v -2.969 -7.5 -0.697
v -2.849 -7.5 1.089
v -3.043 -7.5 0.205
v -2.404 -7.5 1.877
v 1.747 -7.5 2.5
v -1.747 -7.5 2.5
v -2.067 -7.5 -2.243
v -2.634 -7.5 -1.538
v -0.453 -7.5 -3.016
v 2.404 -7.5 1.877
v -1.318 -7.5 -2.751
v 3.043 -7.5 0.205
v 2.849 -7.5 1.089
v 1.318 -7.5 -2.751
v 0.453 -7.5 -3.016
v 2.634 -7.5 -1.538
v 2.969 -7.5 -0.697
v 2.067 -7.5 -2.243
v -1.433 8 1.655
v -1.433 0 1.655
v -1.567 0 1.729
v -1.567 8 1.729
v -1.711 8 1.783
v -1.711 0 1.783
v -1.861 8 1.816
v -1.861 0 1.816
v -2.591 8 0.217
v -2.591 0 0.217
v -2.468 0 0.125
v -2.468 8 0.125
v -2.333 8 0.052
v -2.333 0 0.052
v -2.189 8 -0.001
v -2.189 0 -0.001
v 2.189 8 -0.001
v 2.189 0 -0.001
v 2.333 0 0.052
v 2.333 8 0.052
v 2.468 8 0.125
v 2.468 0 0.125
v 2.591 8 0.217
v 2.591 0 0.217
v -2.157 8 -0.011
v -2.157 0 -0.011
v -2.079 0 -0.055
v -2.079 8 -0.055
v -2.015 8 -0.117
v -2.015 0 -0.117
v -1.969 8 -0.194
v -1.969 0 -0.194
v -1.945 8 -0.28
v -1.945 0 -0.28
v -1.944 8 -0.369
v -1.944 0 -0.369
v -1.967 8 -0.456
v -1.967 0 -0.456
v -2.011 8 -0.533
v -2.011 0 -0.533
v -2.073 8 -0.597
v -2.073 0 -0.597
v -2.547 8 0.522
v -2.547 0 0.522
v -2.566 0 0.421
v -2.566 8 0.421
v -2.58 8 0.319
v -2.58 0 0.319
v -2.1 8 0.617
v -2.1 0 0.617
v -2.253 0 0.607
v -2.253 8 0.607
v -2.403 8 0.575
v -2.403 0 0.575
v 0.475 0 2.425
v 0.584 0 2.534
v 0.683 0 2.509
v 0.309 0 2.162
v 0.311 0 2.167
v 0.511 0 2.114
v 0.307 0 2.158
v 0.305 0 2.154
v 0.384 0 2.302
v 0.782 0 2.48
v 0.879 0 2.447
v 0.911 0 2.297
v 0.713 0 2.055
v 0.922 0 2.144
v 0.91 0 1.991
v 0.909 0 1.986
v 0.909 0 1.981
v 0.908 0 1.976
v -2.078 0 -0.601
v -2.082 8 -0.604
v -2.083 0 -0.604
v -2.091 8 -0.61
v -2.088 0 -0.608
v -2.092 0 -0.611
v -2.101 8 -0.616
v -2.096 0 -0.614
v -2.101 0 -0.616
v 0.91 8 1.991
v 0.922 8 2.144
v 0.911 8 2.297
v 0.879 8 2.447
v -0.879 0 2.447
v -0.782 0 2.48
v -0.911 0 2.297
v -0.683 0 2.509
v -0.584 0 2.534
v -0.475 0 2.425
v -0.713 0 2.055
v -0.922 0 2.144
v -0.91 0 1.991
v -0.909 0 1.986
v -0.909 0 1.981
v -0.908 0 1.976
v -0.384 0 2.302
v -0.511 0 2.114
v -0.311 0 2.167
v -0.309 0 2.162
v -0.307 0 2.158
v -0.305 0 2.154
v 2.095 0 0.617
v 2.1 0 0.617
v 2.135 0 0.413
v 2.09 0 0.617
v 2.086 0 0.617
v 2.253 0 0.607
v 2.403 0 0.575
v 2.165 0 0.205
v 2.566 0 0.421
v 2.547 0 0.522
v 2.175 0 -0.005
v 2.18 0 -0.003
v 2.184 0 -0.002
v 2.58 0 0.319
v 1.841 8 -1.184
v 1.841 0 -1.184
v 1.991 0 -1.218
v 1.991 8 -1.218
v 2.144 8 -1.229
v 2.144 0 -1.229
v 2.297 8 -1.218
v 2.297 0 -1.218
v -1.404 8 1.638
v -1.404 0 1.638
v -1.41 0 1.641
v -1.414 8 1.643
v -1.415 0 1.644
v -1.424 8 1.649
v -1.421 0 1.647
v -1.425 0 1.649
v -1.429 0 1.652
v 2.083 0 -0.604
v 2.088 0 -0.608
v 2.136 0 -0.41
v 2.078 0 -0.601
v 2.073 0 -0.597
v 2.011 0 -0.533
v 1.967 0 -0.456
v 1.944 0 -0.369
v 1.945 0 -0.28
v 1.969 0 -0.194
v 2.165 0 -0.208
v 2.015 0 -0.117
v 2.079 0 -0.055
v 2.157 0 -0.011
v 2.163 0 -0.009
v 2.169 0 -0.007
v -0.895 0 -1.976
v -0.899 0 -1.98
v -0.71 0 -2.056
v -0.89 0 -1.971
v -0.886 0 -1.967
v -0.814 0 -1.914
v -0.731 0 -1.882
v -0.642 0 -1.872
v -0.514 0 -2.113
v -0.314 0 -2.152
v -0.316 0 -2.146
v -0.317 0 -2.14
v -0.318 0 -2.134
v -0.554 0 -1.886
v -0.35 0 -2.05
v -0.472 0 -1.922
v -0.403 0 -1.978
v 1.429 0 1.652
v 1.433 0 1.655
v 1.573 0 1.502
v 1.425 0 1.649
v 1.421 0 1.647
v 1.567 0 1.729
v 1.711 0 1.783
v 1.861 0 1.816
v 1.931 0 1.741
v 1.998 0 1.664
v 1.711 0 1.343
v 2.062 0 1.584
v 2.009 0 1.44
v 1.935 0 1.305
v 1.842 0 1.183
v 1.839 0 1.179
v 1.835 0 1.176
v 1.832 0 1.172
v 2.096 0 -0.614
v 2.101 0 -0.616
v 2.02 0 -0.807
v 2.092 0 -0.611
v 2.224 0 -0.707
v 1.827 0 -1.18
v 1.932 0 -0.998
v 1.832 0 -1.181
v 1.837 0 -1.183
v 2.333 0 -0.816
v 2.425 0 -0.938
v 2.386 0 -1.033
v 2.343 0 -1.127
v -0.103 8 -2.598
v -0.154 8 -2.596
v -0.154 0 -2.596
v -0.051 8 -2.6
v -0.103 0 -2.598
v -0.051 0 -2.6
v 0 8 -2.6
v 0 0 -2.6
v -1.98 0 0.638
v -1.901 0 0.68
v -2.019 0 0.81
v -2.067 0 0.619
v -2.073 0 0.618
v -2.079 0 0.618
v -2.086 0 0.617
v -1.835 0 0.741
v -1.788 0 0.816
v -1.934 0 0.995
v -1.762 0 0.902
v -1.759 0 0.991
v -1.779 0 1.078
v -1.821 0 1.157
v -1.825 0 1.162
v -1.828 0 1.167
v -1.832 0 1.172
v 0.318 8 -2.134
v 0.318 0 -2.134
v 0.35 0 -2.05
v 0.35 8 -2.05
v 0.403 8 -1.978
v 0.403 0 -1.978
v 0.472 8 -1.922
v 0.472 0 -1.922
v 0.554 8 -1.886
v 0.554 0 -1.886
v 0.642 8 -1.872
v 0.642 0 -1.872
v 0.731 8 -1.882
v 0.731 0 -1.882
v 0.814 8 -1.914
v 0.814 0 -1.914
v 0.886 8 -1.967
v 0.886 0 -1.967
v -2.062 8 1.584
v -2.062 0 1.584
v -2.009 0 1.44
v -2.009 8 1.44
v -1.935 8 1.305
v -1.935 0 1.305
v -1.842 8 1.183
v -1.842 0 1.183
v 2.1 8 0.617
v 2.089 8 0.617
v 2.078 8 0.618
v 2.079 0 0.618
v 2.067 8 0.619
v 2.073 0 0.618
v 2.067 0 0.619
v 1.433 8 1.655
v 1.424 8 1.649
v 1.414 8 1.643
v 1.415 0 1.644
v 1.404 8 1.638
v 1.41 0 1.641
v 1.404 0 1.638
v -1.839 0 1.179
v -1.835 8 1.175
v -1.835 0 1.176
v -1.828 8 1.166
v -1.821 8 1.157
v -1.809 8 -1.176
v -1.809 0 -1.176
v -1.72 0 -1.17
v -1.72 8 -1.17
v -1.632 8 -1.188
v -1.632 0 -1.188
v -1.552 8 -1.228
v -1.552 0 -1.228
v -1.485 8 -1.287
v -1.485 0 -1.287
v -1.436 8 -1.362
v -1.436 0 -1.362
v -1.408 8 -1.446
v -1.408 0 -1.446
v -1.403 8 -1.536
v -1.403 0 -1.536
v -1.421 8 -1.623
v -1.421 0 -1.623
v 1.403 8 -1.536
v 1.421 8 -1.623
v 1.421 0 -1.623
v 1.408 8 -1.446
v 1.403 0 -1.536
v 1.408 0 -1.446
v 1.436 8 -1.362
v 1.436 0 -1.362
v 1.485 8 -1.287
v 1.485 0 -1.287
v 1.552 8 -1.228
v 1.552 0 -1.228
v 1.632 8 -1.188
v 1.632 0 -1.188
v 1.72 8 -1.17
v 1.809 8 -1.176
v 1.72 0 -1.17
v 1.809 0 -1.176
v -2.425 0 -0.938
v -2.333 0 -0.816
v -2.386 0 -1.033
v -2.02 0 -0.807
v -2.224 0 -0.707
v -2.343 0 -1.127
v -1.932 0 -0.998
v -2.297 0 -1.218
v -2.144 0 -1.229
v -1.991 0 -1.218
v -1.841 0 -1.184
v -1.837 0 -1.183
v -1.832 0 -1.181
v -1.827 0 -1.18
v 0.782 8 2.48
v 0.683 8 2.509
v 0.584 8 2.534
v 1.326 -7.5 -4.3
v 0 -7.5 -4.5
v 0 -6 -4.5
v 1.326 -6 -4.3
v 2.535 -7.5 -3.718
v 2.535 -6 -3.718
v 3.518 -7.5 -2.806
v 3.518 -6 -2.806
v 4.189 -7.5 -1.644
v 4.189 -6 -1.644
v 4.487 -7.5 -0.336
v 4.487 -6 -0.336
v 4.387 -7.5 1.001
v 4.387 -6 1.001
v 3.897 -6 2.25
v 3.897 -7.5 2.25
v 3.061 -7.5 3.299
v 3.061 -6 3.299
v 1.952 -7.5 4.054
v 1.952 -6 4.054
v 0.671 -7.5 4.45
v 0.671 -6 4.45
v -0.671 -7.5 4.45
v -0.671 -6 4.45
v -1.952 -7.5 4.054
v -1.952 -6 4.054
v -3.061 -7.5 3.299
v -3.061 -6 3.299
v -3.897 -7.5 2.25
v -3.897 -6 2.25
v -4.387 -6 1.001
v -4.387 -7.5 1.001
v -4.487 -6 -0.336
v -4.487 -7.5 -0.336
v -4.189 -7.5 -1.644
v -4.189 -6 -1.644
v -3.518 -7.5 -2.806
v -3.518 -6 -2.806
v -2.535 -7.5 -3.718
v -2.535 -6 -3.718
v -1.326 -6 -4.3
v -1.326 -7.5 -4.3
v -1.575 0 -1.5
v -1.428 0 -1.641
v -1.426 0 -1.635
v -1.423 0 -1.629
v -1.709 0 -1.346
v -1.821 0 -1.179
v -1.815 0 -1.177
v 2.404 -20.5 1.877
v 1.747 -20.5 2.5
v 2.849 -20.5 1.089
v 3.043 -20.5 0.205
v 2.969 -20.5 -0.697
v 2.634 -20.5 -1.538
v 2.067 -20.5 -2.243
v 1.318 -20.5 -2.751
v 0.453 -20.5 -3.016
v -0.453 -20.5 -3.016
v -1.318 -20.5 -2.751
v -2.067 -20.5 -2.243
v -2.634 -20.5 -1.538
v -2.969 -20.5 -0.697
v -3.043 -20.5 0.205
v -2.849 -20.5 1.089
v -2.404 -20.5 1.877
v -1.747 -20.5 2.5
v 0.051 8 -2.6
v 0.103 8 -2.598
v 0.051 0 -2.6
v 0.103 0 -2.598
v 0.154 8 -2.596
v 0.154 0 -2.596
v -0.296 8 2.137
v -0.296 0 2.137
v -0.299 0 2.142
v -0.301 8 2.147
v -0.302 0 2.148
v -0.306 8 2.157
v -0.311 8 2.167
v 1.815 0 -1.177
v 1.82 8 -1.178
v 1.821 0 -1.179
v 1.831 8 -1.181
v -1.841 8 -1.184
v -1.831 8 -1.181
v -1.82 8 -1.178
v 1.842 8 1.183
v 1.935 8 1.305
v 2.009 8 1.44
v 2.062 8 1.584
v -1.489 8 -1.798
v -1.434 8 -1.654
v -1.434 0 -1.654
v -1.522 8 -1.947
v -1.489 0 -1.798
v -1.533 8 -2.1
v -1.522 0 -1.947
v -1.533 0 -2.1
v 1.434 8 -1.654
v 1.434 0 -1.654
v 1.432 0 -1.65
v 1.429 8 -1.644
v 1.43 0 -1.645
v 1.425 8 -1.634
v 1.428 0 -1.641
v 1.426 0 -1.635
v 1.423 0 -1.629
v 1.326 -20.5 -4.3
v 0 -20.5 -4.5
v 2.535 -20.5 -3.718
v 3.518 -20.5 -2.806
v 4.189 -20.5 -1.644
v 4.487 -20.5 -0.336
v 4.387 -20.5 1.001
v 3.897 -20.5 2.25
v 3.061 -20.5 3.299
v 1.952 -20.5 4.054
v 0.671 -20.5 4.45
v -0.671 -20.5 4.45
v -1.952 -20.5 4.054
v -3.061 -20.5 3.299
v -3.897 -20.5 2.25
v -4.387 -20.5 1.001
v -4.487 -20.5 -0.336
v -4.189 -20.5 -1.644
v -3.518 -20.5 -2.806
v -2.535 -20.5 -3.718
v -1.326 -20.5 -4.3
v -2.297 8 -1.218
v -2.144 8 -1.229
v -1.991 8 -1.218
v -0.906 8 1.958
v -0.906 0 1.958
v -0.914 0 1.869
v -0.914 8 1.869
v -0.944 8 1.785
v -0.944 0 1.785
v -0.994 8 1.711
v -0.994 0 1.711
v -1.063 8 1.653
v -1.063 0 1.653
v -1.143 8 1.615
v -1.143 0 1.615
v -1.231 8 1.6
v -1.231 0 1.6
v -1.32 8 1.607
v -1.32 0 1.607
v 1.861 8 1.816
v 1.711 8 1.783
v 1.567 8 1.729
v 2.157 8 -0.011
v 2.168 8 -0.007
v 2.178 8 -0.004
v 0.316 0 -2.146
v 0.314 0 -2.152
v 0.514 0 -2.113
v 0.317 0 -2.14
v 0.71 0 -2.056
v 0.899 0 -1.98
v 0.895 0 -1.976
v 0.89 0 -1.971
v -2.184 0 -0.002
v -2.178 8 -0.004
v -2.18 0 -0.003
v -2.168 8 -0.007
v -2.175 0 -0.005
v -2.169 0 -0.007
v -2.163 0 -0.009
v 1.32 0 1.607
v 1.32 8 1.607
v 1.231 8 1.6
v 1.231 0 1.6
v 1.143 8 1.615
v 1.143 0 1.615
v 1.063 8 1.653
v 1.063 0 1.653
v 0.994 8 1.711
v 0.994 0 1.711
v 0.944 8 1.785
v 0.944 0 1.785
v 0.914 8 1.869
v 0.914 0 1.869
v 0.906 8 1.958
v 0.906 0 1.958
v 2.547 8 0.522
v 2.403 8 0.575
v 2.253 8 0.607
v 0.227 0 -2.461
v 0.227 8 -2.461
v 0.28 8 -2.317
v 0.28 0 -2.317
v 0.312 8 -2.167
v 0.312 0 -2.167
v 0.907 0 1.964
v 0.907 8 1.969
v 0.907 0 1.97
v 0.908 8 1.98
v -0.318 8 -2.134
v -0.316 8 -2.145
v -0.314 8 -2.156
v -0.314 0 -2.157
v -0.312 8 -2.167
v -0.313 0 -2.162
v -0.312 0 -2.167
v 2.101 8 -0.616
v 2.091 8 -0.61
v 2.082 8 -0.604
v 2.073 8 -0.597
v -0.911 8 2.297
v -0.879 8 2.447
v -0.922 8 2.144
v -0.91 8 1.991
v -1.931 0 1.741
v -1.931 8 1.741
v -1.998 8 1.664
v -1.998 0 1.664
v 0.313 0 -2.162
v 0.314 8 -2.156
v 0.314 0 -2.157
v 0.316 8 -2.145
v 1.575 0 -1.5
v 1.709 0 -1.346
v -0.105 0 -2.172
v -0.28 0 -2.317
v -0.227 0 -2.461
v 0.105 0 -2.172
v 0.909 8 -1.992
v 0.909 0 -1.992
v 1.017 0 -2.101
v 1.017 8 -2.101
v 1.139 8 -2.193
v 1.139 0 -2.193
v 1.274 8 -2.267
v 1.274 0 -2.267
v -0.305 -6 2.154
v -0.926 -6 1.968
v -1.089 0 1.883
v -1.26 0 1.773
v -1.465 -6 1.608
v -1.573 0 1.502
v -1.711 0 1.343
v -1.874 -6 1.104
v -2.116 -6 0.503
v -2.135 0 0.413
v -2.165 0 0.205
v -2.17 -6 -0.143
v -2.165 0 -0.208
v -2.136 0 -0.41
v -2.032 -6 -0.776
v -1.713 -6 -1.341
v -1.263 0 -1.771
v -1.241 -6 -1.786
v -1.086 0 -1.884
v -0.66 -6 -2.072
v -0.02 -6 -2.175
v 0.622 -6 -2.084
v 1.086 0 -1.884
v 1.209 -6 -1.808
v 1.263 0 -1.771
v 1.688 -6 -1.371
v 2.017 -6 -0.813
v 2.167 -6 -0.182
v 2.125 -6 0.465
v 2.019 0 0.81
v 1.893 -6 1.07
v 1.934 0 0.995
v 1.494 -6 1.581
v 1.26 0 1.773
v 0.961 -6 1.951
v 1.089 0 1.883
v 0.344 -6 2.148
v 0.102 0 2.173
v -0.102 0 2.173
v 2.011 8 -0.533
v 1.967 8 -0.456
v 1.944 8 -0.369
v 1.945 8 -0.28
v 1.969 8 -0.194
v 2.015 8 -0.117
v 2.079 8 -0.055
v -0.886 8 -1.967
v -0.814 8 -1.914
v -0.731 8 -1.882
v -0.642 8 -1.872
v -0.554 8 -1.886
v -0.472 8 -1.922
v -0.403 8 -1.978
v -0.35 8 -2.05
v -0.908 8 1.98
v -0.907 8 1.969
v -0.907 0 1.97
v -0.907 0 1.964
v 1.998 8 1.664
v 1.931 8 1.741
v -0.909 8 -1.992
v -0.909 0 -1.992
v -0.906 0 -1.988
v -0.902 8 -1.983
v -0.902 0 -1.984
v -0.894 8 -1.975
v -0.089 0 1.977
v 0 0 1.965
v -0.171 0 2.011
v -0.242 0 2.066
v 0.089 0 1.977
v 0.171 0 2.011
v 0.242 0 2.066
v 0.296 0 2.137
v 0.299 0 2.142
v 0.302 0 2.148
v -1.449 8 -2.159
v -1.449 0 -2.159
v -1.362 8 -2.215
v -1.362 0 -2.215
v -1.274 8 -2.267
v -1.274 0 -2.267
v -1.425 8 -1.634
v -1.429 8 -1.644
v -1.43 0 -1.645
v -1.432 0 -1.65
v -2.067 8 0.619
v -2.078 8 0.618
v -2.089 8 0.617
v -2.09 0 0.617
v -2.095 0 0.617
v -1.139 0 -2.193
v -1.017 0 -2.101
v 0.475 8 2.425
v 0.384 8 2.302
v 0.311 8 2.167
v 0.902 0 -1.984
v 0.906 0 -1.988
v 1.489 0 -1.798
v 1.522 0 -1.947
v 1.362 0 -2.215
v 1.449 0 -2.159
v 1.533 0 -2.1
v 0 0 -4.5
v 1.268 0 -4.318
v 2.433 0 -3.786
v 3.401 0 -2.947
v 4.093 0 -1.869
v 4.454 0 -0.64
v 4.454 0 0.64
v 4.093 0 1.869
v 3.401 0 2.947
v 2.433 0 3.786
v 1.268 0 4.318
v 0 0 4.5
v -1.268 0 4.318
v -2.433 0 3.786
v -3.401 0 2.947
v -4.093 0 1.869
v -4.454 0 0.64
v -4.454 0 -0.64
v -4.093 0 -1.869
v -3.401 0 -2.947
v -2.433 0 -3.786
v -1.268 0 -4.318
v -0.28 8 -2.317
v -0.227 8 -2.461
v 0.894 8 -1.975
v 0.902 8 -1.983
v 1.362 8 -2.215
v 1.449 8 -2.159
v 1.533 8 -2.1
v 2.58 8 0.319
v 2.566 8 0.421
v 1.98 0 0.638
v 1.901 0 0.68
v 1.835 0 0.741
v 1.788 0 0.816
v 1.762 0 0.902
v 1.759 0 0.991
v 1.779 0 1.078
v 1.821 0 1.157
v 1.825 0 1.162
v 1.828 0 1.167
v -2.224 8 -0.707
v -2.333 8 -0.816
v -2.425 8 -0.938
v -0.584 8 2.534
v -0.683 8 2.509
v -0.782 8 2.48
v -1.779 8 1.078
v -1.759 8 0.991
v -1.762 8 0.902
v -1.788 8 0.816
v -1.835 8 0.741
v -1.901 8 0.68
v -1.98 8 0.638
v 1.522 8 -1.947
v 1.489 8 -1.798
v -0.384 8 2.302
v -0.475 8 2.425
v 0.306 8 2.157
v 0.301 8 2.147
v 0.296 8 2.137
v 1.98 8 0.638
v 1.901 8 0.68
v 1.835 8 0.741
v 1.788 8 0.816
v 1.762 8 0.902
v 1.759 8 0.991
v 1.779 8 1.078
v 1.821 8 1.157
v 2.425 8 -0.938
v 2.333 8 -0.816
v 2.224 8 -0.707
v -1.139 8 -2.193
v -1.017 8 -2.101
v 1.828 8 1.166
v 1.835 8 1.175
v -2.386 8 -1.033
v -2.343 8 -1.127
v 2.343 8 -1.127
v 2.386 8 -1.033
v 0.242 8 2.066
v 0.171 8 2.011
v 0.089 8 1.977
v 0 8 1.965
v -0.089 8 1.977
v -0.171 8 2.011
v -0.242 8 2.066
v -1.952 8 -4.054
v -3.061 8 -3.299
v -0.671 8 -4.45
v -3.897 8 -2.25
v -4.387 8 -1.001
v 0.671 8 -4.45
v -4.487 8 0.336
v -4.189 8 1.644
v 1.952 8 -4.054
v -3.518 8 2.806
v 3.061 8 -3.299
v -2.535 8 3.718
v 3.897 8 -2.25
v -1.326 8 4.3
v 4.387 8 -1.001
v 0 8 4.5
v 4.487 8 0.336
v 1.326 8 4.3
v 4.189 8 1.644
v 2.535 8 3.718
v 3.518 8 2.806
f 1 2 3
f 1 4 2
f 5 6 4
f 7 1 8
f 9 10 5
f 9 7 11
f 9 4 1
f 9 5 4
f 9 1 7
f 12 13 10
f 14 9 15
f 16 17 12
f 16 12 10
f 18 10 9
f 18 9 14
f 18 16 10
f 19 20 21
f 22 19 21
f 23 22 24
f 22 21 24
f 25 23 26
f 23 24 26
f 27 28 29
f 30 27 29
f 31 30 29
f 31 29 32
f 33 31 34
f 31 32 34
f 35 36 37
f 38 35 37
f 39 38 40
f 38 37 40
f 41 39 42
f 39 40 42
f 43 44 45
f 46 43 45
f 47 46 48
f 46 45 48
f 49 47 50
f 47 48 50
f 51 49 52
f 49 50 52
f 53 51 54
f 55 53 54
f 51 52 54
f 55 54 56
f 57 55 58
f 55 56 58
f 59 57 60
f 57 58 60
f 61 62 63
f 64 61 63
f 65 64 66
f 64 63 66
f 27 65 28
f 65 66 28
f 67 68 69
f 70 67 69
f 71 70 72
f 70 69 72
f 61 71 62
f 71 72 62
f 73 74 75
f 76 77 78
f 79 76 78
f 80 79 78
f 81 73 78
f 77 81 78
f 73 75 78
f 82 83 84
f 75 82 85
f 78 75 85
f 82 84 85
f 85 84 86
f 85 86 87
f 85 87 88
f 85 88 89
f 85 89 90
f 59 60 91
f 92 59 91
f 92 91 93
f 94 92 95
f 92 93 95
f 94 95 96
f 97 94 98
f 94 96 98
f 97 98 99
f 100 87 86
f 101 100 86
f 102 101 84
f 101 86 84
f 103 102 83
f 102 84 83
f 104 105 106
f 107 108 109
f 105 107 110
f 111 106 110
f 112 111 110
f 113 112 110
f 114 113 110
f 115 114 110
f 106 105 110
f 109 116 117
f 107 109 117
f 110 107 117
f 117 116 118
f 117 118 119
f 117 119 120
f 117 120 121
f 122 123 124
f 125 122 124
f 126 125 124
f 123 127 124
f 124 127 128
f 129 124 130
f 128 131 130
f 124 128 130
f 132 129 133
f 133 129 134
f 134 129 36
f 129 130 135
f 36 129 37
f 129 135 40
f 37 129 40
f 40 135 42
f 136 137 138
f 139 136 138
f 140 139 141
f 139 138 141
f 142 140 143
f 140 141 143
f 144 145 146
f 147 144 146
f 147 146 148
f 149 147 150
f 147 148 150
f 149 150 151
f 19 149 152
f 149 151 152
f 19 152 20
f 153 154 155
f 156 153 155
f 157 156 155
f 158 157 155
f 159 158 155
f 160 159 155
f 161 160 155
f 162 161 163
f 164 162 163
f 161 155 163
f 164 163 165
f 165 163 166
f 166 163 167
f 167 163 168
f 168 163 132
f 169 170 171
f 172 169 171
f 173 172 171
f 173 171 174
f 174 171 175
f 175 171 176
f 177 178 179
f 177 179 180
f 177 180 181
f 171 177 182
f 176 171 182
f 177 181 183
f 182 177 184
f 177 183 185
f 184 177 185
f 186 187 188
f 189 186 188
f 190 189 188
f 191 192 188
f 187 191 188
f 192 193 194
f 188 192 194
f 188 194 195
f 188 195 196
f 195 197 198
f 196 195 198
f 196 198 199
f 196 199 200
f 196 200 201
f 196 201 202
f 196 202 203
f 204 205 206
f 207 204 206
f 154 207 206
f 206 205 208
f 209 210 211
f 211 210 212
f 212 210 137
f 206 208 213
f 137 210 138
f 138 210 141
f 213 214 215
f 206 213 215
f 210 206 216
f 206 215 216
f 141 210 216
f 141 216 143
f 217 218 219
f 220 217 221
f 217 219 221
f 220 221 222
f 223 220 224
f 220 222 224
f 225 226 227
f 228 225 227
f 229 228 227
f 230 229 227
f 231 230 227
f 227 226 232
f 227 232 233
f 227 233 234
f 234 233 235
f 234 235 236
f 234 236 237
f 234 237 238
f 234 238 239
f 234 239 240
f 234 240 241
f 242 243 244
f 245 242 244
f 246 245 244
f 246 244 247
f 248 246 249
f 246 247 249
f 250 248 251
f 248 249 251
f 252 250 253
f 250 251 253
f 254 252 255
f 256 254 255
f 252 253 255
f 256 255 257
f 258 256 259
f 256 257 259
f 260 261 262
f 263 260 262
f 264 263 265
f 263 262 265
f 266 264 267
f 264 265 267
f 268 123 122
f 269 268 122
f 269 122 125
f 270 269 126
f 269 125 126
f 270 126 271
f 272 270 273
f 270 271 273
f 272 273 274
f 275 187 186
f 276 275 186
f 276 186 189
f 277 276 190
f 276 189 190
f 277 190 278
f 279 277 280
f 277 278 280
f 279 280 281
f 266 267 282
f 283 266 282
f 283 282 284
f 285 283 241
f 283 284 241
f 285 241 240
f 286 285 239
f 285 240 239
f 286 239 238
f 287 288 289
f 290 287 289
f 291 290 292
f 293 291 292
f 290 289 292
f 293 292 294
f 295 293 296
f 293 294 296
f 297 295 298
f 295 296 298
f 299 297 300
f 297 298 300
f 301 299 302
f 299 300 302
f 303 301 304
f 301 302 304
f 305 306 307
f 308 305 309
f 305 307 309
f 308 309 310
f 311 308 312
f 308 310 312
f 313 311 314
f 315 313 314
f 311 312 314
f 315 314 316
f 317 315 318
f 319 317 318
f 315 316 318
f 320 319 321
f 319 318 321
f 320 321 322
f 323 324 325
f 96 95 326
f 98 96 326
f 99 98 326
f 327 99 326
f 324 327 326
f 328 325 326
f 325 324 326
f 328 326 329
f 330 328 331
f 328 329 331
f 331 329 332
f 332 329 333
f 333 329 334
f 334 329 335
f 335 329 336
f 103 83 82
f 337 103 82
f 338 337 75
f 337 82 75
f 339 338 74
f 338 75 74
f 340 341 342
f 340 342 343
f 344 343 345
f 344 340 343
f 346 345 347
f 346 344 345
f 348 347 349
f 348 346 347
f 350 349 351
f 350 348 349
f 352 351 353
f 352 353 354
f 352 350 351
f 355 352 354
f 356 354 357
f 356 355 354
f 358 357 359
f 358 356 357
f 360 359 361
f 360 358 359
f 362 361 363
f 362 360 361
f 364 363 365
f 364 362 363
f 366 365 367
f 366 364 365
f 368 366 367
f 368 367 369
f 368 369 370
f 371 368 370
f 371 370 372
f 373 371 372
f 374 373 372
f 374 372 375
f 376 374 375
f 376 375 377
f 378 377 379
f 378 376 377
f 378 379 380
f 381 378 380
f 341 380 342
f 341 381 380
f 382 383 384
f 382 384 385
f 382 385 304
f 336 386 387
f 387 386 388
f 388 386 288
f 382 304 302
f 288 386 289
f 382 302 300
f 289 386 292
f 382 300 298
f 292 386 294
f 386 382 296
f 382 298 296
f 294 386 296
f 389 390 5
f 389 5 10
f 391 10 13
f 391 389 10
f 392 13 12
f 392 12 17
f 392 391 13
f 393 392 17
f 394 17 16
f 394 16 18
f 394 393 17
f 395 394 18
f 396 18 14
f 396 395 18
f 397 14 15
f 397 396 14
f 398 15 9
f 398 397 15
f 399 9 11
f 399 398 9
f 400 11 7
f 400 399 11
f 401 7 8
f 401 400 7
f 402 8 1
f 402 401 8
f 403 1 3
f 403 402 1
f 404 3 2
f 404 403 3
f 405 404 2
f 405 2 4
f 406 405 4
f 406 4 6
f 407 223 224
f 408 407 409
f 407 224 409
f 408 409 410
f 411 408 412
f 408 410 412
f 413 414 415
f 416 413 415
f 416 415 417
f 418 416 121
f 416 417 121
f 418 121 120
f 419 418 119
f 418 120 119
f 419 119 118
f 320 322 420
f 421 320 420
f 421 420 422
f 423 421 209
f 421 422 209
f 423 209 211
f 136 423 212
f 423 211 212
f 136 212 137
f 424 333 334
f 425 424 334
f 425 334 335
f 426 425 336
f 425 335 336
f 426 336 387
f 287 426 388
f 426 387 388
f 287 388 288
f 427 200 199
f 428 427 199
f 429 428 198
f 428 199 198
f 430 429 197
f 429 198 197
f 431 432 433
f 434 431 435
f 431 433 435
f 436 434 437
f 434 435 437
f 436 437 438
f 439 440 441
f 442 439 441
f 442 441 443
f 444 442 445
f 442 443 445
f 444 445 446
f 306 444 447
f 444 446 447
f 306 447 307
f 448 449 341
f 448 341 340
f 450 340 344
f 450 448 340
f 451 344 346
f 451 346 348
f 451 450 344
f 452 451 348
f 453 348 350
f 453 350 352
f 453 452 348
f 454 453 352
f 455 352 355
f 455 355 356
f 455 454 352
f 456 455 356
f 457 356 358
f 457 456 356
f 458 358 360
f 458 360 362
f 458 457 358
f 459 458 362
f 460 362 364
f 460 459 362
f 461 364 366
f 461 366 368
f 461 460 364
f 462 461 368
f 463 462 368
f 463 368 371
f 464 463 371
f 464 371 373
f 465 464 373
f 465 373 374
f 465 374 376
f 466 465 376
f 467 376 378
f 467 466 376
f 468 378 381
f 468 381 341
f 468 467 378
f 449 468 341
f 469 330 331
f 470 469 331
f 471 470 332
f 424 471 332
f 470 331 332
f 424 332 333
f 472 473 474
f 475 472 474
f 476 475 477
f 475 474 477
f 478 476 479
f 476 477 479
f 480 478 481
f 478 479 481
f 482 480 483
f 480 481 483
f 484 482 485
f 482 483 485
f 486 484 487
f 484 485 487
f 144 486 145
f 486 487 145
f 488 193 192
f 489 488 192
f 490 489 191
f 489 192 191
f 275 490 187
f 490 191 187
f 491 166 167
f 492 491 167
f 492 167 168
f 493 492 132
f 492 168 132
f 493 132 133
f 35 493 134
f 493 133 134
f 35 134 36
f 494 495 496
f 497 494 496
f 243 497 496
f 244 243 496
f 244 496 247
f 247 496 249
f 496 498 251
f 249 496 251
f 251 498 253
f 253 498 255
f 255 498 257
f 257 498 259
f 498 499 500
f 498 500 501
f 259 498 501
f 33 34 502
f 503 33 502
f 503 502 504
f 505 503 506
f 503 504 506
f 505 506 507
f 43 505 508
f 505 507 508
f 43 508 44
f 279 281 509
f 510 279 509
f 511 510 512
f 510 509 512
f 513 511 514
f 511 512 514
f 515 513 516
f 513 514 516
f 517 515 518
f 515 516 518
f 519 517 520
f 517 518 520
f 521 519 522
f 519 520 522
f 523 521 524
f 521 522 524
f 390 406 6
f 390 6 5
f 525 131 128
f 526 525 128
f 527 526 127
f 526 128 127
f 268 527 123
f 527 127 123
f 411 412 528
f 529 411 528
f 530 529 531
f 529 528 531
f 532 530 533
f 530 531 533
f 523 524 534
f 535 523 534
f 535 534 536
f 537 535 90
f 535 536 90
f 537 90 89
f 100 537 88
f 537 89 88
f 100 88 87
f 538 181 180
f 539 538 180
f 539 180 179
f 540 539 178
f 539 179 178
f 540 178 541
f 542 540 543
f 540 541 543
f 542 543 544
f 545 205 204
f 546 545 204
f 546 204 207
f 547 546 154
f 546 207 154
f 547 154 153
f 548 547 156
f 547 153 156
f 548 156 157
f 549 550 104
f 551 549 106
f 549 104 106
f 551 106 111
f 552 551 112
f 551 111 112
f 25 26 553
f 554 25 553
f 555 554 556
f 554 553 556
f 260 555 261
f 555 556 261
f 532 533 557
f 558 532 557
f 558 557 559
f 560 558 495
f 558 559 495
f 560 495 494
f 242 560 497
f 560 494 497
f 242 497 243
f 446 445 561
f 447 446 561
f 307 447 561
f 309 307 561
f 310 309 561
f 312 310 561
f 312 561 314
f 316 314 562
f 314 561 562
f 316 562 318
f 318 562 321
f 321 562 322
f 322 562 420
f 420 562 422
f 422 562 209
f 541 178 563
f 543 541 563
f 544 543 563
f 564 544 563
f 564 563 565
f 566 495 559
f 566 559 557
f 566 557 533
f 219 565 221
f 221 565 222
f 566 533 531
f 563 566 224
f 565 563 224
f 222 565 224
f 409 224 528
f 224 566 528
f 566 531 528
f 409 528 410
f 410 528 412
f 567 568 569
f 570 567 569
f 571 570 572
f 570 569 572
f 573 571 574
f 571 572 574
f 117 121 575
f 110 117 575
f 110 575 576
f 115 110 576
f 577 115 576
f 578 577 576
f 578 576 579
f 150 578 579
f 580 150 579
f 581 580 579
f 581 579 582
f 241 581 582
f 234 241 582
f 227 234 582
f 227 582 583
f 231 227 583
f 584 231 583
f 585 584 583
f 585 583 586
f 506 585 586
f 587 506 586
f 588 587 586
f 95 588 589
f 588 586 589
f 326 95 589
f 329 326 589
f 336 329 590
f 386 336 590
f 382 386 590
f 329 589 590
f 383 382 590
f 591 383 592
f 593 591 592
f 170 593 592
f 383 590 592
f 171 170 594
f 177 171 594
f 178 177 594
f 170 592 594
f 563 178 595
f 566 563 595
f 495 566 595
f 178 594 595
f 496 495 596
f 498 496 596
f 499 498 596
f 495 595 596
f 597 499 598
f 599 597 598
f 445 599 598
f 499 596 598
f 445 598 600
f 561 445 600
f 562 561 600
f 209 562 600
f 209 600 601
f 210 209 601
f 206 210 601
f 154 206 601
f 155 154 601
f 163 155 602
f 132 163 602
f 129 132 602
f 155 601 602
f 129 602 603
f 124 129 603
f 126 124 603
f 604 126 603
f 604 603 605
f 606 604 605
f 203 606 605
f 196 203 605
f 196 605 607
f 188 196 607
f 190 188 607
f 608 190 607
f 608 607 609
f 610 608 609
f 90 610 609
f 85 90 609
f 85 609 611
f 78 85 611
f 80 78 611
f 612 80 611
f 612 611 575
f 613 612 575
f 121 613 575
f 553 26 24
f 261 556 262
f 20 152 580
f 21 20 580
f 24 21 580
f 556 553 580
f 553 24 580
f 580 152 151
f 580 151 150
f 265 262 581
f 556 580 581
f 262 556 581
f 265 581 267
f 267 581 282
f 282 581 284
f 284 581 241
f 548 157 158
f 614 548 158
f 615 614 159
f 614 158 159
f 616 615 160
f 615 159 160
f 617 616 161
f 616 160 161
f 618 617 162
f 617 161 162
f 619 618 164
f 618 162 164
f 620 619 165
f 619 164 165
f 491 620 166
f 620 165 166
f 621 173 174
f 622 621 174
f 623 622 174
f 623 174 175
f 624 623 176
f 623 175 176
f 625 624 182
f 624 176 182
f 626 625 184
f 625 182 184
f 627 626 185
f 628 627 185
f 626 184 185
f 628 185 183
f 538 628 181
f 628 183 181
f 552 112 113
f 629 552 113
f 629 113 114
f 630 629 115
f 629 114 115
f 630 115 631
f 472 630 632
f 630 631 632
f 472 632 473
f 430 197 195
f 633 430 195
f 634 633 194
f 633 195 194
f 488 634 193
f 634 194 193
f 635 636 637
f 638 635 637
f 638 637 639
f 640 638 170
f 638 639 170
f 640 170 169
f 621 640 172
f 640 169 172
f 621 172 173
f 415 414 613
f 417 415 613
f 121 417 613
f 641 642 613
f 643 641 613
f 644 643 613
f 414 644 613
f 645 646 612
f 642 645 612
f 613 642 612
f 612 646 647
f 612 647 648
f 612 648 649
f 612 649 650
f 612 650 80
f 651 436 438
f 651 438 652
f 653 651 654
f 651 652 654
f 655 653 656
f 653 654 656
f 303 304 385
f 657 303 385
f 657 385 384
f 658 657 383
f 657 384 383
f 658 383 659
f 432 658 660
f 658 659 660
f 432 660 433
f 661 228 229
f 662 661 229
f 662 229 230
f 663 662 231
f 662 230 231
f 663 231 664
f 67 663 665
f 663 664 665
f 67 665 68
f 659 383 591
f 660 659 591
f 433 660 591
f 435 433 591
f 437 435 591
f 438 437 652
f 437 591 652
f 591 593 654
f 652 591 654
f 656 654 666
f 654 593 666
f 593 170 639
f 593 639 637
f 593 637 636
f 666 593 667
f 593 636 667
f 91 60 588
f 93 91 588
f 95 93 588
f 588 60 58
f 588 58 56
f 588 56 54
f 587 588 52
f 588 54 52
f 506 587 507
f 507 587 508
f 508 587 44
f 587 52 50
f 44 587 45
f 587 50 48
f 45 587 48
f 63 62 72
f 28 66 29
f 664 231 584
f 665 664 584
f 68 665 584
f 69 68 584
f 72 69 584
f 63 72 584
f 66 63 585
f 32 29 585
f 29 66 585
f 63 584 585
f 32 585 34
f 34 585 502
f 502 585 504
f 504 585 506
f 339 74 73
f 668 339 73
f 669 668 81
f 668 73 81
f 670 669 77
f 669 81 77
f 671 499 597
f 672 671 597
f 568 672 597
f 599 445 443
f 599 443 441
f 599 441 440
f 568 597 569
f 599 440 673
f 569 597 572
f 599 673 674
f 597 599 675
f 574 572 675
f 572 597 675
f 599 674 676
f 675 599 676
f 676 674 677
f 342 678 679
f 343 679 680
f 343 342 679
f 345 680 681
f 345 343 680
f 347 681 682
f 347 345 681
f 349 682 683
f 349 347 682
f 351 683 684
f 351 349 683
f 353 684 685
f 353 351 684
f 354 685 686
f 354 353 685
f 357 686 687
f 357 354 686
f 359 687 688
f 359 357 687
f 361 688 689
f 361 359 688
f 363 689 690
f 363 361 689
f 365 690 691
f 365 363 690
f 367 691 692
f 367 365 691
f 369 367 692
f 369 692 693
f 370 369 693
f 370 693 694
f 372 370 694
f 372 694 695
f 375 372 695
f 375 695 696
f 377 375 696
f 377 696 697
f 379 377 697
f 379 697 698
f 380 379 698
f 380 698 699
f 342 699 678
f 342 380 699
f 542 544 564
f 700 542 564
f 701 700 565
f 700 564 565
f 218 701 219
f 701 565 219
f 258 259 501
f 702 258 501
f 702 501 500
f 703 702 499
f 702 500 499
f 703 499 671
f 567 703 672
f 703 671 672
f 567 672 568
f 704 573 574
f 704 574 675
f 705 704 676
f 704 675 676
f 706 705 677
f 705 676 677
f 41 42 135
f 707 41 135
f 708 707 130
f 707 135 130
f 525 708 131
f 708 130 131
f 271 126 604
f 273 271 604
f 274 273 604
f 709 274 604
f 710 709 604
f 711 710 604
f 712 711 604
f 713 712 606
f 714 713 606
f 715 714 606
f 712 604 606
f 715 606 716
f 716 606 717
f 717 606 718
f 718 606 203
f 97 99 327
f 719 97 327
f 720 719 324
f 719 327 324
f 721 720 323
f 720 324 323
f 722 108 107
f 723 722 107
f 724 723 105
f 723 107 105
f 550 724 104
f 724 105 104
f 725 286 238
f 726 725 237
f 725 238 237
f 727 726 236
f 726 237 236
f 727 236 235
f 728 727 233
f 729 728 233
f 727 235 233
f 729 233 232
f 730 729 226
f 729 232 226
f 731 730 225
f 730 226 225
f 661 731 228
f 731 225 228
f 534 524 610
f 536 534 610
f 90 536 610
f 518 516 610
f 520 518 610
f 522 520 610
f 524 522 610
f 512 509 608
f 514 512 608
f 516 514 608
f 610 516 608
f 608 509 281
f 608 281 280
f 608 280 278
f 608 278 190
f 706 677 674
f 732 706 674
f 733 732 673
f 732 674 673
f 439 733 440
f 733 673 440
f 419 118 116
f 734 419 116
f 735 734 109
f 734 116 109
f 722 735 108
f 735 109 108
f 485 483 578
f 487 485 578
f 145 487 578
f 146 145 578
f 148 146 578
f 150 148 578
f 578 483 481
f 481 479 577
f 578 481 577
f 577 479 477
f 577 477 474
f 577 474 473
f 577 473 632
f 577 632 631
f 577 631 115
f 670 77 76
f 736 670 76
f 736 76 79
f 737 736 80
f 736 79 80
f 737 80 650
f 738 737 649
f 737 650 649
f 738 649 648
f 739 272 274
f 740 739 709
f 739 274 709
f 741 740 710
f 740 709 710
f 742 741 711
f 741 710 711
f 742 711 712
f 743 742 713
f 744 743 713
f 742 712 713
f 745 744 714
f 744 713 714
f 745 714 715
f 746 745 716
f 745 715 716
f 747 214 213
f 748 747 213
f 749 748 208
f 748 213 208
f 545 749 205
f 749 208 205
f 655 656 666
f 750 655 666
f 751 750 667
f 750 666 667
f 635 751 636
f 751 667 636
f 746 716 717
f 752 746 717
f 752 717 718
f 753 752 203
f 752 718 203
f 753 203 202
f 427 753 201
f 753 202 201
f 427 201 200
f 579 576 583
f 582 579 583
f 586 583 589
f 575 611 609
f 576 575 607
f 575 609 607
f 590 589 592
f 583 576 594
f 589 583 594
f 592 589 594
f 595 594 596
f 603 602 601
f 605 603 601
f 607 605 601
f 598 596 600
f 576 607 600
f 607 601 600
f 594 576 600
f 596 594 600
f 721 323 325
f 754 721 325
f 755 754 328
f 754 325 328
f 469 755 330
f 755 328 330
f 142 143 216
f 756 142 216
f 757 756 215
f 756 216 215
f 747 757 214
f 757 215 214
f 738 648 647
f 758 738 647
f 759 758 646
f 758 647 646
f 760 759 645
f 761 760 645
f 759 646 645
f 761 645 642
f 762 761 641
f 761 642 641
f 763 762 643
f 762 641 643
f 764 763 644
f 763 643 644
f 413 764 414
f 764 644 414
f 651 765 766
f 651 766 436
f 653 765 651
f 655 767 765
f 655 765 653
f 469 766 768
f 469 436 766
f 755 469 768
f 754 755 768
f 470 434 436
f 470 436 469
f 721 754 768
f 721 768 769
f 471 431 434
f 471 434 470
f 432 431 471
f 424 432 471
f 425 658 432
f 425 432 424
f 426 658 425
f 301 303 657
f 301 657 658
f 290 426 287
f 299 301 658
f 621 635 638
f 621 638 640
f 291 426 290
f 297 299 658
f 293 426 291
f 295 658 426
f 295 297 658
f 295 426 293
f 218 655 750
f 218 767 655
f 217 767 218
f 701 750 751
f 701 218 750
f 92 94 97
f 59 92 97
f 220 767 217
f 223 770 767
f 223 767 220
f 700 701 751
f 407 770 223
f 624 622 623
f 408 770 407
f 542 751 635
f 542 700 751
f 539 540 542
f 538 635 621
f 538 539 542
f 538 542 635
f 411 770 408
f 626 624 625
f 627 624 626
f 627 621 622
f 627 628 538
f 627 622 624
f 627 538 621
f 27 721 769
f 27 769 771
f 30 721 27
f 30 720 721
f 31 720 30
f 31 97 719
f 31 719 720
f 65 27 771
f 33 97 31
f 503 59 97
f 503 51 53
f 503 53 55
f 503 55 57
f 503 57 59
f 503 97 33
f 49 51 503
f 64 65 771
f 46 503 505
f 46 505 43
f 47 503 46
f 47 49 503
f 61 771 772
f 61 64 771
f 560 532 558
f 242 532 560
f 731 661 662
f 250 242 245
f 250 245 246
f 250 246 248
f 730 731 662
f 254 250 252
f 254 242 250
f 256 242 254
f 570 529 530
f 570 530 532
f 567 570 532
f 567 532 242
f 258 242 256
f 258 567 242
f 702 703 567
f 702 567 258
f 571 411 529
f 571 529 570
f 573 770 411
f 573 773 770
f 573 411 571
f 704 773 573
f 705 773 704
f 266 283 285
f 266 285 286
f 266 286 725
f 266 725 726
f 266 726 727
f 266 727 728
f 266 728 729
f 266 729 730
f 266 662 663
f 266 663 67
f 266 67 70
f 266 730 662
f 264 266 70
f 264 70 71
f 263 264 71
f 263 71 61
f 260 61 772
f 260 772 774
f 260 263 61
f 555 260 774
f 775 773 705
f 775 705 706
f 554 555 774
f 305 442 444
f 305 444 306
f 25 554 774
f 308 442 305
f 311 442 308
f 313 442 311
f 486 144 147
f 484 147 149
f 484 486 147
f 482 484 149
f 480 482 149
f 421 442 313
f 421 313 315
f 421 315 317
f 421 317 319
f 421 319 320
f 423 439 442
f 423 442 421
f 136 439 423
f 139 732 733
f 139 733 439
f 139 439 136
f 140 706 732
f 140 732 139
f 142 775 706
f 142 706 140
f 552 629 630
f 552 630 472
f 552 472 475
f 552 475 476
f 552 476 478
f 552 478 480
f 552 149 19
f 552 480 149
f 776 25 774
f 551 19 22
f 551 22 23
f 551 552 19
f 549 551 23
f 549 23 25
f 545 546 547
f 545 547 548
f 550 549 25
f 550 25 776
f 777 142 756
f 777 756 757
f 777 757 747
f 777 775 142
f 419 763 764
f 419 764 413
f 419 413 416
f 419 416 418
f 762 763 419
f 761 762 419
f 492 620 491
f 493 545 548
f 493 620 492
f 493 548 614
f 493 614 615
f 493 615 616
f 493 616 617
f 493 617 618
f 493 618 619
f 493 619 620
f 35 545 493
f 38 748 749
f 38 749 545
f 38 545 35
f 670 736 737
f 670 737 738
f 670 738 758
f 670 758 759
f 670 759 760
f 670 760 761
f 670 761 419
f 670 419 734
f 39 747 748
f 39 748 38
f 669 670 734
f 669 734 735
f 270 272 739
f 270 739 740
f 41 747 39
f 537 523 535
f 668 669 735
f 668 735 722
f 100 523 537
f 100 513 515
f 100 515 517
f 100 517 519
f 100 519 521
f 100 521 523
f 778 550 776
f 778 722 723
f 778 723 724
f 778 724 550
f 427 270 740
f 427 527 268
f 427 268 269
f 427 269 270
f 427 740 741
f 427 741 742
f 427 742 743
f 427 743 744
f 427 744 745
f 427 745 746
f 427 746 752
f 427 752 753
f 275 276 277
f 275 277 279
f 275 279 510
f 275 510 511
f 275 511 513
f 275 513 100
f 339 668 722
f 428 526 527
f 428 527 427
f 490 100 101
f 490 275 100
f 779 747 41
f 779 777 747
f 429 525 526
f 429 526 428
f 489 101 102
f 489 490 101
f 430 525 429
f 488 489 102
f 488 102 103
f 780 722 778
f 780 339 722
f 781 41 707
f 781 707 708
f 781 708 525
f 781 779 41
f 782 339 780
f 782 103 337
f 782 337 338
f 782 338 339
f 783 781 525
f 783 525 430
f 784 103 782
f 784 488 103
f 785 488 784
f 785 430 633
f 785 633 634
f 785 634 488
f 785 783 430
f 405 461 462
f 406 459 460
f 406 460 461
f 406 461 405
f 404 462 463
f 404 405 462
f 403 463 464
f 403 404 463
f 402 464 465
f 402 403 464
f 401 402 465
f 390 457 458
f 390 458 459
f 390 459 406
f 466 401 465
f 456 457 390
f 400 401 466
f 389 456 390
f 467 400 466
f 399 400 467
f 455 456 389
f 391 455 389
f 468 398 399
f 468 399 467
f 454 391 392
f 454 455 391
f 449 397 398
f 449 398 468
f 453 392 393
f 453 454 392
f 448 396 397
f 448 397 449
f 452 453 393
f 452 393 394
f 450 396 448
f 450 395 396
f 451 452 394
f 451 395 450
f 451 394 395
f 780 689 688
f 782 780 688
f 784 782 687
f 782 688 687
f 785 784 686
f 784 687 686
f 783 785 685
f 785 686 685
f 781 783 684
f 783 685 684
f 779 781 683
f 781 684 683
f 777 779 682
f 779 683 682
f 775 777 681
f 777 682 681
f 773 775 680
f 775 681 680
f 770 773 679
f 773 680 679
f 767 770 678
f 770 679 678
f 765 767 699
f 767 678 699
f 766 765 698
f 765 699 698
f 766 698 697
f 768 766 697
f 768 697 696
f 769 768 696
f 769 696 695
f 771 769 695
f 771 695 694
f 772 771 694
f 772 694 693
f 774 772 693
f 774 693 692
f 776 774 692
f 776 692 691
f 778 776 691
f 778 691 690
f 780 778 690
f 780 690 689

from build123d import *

# Parameters (mm, degrees)
SKETCH1_R           = 4.5
BOSS_EXTRUDE1_DEPTH = 8
BOSS_EXTRUDE2_START = 6
SKETCH2_R           = 4.5
SKETCH2_R_2         = 2.175
BOSS_EXTRUDE2_DEPTH = 6
BOSS_EXTRUDE3_START = 1.5
SKETCH3_R           = 4.5
BOSS_EXTRUDE3_DEPTH = 1.5
BOSS_EXTRUDE4_START = 13
SKETCH4_R           = 4.5
BOSS_EXTRUDE4_DEPTH = 13


with BuildPart() as part:
    # Sketch1 → Boss-Extrude1 (new body)
    with BuildSketch(Plane(origin=(0, 0, 0), x_dir=(1, 0, 0), z_dir=(0, 1, 0))):
        with Locations(Location((0, 0, 0), (0, 0, 270))):
            Circle(SKETCH1_R)
        with BuildLine():
            ThreePointArc((-0.909869568, -1.991090343), (-0.907761332, -1.974465286), (-0.906473122, -1.957756676))
            ThreePointArc((-0.906473122, -1.957756676), (-1.062514579, -1.653304957), (-1.404275568, -1.63783847))
            ThreePointArc((-1.404275568, -1.63783847), (-1.418939112, -1.645951275), (-1.433186003, -1.654775291))
            ThreePointArc((-1.433186003, -1.654775291), (-1.638194551, -1.758833668), (-1.86090652, -1.815895294))
            ThreePointArc((-1.86090652, -1.815895294), (-1.965014118, -1.702694426), (-2.062246708, -1.58353633))
            ThreePointArc((-2.062246708, -1.58353633), (-1.97407067, -1.371211963), (-1.841895699, -1.183099158))
            ThreePointArc((-1.841895699, -1.183099158), (-1.831133954, -1.170253069), (-1.821016886, -1.15689335))
            ThreePointArc((-1.821016886, -1.15689335), (-1.787688286, -0.816409885), (-2.066834111, -0.618628708))
            ThreePointArc((-2.066834111, -0.618628708), (-2.083555984, -0.617525923), (-2.100311854, -0.617246707))
            ThreePointArc((-2.100311854, -0.617246707), (-2.329034225, -0.593950196), (-2.5472413, -0.521546309))
            ThreePointArc((-2.5472413, -0.521546309), (-2.573621175, -0.370030862), (-2.590996705, -0.217220785))
            ThreePointArc((-2.590996705, -0.217220785), (-2.402027082, -0.086273727), (-2.18913296, 0.00051765))
            ThreePointArc((-2.18913296, 0.00051765), (-2.173134484, 0.00550623), (-2.157400655, 0.01127544))
            ThreePointArc((-2.157400655, 0.01127544), (-1.945283594, 0.279689557), (-2.073187428, 0.596991297))
            ThreePointArc((-2.073187428, 0.596991297), (-2.086658552, 0.606959546), (-2.100603532, 0.616253345))
            ThreePointArc((-2.100603532, 0.616253345), (-2.280421989, 0.759508267), (-2.424844966, 0.938389944))
            ThreePointArc((-2.424844966, 0.938389944), (-2.365121694, 1.080114886), (-2.297123554, 1.218060823))
            ThreePointArc((-2.297123554, 1.218060823), (-2.067356867, 1.226055807), (-1.841335974, 1.183970107))
            ThreePointArc((-1.841335974, 1.183970107), (-1.825180169, 1.179517339), (-1.80882496, 1.175864357))
            ThreePointArc((-1.80882496, 1.175864357), (-1.485265106, 1.28698954), (-1.421318385, 1.623070784))
            ThreePointArc((-1.421318385, 1.623070784), (-1.427261774, 1.638739648), (-1.43396843, 1.654097314))
            ThreePointArc((-1.43396843, 1.654097314), (-1.507791885, 1.871828221), (-1.532577488, 2.10039402))
            ThreePointArc((-1.532577488, 2.10039402), (-1.405712785, 2.18733179), (-1.273929906, 2.266616727))
            ThreePointArc((-1.273929906, 2.266616727), (-1.076315454, 2.149121286), (-0.908927826, 1.991520422))
            ThreePointArc((-0.908927826, 1.991520422), (-0.897744047, 1.979040027), (-0.88596012, 1.96712465))
            ThreePointArc((-0.88596012, 1.96712465), (-0.55368544, 1.885679438), (-0.318190798, 2.133836765))
            ThreePointArc((-0.318190798, 2.133836765), (-0.314719467, 2.15023149), (-0.312058484, 2.166777073))
            ThreePointArc((-0.312058484, 2.166777073), (-0.25644851, 2.389855941), (-0.153727486, 2.595537835))
            ThreePointArc((-0.153727486, 2.595537835), (-0.076897381, 2.598948939), (0, 2.600086305))
            ThreePointArc((0, 2.600086305), (0.076897381, 2.598948939), (0.153727486, 2.595537835))
            ThreePointArc((0.153727486, 2.595537835), (0.25644851, 2.389855941), (0.312058484, 2.166777073))
            ThreePointArc((0.312058484, 2.166777073), (0.314719467, 2.15023149), (0.318190798, 2.133836765))
            ThreePointArc((0.318190798, 2.133836765), (0.55368544, 1.885679438), (0.88596012, 1.96712465))
            ThreePointArc((0.88596012, 1.96712465), (0.897744047, 1.979040027), (0.908927826, 1.991520422))
            ThreePointArc((0.908927826, 1.991520422), (1.076315454, 2.149121286), (1.273929906, 2.266616727))
            ThreePointArc((1.273929906, 2.266616727), (1.405712785, 2.18733179), (1.532577488, 2.10039402))
            ThreePointArc((1.532577488, 2.10039402), (1.507791885, 1.871828221), (1.43396843, 1.654097314))
            ThreePointArc((1.43396843, 1.654097314), (1.427261774, 1.638739648), (1.421318385, 1.623070784))
            ThreePointArc((1.421318385, 1.623070784), (1.485265106, 1.28698954), (1.80882496, 1.175864357))
            ThreePointArc((1.80882496, 1.175864357), (1.825180169, 1.179517339), (1.841335974, 1.183970107))
            ThreePointArc((1.841335974, 1.183970107), (2.067356867, 1.226055807), (2.297123554, 1.218060823))
            ThreePointArc((2.297123554, 1.218060823), (2.365121694, 1.080114886), (2.424844966, 0.938389944))
            ThreePointArc((2.424844966, 0.938389944), (2.280421989, 0.759508267), (2.100603532, 0.616253345))
            ThreePointArc((2.100603532, 0.616253345), (2.086658552, 0.606959546), (2.073187428, 0.596991297))
            ThreePointArc((2.073187428, 0.596991297), (1.945283594, 0.279689557), (2.157400655, 0.01127544))
            ThreePointArc((2.157400655, 0.01127544), (2.173134484, 0.00550623), (2.18913296, 0.00051765))
            ThreePointArc((2.18913296, 0.00051765), (2.402027082, -0.086273727), (2.590996705, -0.217220785))
            ThreePointArc((2.590996705, -0.217220785), (2.573621175, -0.370030862), (2.5472413, -0.521546309))
            ThreePointArc((2.5472413, -0.521546309), (2.329034225, -0.593950196), (2.100311854, -0.617246707))
            ThreePointArc((2.100311854, -0.617246707), (2.083555984, -0.617525923), (2.066834111, -0.618628708))
            ThreePointArc((2.066834111, -0.618628708), (1.787688286, -0.816409885), (1.821016886, -1.15689335))
            ThreePointArc((1.821016886, -1.15689335), (1.831133954, -1.170253069), (1.841895699, -1.183099158))
            ThreePointArc((1.841895699, -1.183099158), (1.97407067, -1.371211963), (2.062246708, -1.58353633))
            ThreePointArc((2.062246708, -1.58353633), (1.965014118, -1.702694426), (1.86090652, -1.815895294))
            ThreePointArc((1.86090652, -1.815895294), (1.638194552, -1.758833667), (1.433186005, -1.65477529))
            ThreePointArc((1.433186005, -1.65477529), (1.418939115, -1.645951274), (1.40427557, -1.637838469))
            ThreePointArc((1.40427557, -1.637838469), (1.06251458, -1.653304956), (0.906473122, -1.957756676))
            ThreePointArc((0.906473122, -1.957756676), (0.907761332, -1.974465287), (0.909869568, -1.991090343))
            ThreePointArc((0.909869568, -1.991090343), (0.919360768, -2.220800089), (0.878747953, -2.447090278))
            ThreePointArc((0.878747953, -2.447090278), (0.732528963, -2.49476454), (0.583747068, -2.533710353))
            ThreePointArc((0.583747068, -2.533710353), (0.427239681, -2.365299878), (0.311033722, -2.166924412))
            ThreePointArc((0.311033722, -2.166924412), (0.303819099, -2.151798727), (0.295869453, -2.13704609))
            ThreePointArc((0.295869453, -2.13704609), (0, -1.965287386), (-0.295869453, -2.13704609))
            ThreePointArc((-0.295869453, -2.13704609), (-0.303819099, -2.151798726), (-0.311033722, -2.166924412))
            ThreePointArc((-0.311033722, -2.166924412), (-0.427239681, -2.365299878), (-0.583747068, -2.533710353))
            ThreePointArc((-0.583747068, -2.533710353), (-0.732528963, -2.49476454), (-0.878747953, -2.447090278))
            ThreePointArc((-0.878747953, -2.447090278), (-0.919360769, -2.220800089), (-0.909869568, -1.991090343))
        make_face(mode=Mode.SUBTRACT)
    extrude(amount=BOSS_EXTRUDE1_DEPTH)

    # Sketch2 → Boss-Extrude2 (add)
    with BuildSketch(Plane.XZ.offset(BOSS_EXTRUDE2_START)):
        with Locations(Location((0, 0, 0), (0, 0, 270))):
            Circle(SKETCH2_R)
        with Locations(Location((0, 0, 0), (0, 0, 98.053222352))):
            Circle(SKETCH2_R_2, mode=Mode.SUBTRACT)
    extrude(amount=-BOSS_EXTRUDE2_DEPTH)

    # Sketch3 → Boss-Extrude3 (add)
    with BuildSketch(Plane.XZ.offset(6).offset(BOSS_EXTRUDE3_START)):
        with Locations(Location((0, 0, 0), (0, 0, 270))):
            Circle(SKETCH3_R)
    extrude(amount=-BOSS_EXTRUDE3_DEPTH)

    # Sketch4 → Boss-Extrude4 (add)
    with BuildSketch(Plane.XZ.offset(7.5).offset(BOSS_EXTRUDE4_START)):
        with Locations(Location((0, 0, 0), (0, 0, 270))):
            Circle(SKETCH4_R)
        with BuildLine():
            Line((-1.747140521, 2.5), (1.747140521, 2.5))
            ThreePointArc((1.747140521, 2.5), (0, -3.05), (-1.747140521, 2.5))
        make_face(mode=Mode.SUBTRACT)
    extrude(amount=-BOSS_EXTRUDE4_DEPTH)


solid = part.part
